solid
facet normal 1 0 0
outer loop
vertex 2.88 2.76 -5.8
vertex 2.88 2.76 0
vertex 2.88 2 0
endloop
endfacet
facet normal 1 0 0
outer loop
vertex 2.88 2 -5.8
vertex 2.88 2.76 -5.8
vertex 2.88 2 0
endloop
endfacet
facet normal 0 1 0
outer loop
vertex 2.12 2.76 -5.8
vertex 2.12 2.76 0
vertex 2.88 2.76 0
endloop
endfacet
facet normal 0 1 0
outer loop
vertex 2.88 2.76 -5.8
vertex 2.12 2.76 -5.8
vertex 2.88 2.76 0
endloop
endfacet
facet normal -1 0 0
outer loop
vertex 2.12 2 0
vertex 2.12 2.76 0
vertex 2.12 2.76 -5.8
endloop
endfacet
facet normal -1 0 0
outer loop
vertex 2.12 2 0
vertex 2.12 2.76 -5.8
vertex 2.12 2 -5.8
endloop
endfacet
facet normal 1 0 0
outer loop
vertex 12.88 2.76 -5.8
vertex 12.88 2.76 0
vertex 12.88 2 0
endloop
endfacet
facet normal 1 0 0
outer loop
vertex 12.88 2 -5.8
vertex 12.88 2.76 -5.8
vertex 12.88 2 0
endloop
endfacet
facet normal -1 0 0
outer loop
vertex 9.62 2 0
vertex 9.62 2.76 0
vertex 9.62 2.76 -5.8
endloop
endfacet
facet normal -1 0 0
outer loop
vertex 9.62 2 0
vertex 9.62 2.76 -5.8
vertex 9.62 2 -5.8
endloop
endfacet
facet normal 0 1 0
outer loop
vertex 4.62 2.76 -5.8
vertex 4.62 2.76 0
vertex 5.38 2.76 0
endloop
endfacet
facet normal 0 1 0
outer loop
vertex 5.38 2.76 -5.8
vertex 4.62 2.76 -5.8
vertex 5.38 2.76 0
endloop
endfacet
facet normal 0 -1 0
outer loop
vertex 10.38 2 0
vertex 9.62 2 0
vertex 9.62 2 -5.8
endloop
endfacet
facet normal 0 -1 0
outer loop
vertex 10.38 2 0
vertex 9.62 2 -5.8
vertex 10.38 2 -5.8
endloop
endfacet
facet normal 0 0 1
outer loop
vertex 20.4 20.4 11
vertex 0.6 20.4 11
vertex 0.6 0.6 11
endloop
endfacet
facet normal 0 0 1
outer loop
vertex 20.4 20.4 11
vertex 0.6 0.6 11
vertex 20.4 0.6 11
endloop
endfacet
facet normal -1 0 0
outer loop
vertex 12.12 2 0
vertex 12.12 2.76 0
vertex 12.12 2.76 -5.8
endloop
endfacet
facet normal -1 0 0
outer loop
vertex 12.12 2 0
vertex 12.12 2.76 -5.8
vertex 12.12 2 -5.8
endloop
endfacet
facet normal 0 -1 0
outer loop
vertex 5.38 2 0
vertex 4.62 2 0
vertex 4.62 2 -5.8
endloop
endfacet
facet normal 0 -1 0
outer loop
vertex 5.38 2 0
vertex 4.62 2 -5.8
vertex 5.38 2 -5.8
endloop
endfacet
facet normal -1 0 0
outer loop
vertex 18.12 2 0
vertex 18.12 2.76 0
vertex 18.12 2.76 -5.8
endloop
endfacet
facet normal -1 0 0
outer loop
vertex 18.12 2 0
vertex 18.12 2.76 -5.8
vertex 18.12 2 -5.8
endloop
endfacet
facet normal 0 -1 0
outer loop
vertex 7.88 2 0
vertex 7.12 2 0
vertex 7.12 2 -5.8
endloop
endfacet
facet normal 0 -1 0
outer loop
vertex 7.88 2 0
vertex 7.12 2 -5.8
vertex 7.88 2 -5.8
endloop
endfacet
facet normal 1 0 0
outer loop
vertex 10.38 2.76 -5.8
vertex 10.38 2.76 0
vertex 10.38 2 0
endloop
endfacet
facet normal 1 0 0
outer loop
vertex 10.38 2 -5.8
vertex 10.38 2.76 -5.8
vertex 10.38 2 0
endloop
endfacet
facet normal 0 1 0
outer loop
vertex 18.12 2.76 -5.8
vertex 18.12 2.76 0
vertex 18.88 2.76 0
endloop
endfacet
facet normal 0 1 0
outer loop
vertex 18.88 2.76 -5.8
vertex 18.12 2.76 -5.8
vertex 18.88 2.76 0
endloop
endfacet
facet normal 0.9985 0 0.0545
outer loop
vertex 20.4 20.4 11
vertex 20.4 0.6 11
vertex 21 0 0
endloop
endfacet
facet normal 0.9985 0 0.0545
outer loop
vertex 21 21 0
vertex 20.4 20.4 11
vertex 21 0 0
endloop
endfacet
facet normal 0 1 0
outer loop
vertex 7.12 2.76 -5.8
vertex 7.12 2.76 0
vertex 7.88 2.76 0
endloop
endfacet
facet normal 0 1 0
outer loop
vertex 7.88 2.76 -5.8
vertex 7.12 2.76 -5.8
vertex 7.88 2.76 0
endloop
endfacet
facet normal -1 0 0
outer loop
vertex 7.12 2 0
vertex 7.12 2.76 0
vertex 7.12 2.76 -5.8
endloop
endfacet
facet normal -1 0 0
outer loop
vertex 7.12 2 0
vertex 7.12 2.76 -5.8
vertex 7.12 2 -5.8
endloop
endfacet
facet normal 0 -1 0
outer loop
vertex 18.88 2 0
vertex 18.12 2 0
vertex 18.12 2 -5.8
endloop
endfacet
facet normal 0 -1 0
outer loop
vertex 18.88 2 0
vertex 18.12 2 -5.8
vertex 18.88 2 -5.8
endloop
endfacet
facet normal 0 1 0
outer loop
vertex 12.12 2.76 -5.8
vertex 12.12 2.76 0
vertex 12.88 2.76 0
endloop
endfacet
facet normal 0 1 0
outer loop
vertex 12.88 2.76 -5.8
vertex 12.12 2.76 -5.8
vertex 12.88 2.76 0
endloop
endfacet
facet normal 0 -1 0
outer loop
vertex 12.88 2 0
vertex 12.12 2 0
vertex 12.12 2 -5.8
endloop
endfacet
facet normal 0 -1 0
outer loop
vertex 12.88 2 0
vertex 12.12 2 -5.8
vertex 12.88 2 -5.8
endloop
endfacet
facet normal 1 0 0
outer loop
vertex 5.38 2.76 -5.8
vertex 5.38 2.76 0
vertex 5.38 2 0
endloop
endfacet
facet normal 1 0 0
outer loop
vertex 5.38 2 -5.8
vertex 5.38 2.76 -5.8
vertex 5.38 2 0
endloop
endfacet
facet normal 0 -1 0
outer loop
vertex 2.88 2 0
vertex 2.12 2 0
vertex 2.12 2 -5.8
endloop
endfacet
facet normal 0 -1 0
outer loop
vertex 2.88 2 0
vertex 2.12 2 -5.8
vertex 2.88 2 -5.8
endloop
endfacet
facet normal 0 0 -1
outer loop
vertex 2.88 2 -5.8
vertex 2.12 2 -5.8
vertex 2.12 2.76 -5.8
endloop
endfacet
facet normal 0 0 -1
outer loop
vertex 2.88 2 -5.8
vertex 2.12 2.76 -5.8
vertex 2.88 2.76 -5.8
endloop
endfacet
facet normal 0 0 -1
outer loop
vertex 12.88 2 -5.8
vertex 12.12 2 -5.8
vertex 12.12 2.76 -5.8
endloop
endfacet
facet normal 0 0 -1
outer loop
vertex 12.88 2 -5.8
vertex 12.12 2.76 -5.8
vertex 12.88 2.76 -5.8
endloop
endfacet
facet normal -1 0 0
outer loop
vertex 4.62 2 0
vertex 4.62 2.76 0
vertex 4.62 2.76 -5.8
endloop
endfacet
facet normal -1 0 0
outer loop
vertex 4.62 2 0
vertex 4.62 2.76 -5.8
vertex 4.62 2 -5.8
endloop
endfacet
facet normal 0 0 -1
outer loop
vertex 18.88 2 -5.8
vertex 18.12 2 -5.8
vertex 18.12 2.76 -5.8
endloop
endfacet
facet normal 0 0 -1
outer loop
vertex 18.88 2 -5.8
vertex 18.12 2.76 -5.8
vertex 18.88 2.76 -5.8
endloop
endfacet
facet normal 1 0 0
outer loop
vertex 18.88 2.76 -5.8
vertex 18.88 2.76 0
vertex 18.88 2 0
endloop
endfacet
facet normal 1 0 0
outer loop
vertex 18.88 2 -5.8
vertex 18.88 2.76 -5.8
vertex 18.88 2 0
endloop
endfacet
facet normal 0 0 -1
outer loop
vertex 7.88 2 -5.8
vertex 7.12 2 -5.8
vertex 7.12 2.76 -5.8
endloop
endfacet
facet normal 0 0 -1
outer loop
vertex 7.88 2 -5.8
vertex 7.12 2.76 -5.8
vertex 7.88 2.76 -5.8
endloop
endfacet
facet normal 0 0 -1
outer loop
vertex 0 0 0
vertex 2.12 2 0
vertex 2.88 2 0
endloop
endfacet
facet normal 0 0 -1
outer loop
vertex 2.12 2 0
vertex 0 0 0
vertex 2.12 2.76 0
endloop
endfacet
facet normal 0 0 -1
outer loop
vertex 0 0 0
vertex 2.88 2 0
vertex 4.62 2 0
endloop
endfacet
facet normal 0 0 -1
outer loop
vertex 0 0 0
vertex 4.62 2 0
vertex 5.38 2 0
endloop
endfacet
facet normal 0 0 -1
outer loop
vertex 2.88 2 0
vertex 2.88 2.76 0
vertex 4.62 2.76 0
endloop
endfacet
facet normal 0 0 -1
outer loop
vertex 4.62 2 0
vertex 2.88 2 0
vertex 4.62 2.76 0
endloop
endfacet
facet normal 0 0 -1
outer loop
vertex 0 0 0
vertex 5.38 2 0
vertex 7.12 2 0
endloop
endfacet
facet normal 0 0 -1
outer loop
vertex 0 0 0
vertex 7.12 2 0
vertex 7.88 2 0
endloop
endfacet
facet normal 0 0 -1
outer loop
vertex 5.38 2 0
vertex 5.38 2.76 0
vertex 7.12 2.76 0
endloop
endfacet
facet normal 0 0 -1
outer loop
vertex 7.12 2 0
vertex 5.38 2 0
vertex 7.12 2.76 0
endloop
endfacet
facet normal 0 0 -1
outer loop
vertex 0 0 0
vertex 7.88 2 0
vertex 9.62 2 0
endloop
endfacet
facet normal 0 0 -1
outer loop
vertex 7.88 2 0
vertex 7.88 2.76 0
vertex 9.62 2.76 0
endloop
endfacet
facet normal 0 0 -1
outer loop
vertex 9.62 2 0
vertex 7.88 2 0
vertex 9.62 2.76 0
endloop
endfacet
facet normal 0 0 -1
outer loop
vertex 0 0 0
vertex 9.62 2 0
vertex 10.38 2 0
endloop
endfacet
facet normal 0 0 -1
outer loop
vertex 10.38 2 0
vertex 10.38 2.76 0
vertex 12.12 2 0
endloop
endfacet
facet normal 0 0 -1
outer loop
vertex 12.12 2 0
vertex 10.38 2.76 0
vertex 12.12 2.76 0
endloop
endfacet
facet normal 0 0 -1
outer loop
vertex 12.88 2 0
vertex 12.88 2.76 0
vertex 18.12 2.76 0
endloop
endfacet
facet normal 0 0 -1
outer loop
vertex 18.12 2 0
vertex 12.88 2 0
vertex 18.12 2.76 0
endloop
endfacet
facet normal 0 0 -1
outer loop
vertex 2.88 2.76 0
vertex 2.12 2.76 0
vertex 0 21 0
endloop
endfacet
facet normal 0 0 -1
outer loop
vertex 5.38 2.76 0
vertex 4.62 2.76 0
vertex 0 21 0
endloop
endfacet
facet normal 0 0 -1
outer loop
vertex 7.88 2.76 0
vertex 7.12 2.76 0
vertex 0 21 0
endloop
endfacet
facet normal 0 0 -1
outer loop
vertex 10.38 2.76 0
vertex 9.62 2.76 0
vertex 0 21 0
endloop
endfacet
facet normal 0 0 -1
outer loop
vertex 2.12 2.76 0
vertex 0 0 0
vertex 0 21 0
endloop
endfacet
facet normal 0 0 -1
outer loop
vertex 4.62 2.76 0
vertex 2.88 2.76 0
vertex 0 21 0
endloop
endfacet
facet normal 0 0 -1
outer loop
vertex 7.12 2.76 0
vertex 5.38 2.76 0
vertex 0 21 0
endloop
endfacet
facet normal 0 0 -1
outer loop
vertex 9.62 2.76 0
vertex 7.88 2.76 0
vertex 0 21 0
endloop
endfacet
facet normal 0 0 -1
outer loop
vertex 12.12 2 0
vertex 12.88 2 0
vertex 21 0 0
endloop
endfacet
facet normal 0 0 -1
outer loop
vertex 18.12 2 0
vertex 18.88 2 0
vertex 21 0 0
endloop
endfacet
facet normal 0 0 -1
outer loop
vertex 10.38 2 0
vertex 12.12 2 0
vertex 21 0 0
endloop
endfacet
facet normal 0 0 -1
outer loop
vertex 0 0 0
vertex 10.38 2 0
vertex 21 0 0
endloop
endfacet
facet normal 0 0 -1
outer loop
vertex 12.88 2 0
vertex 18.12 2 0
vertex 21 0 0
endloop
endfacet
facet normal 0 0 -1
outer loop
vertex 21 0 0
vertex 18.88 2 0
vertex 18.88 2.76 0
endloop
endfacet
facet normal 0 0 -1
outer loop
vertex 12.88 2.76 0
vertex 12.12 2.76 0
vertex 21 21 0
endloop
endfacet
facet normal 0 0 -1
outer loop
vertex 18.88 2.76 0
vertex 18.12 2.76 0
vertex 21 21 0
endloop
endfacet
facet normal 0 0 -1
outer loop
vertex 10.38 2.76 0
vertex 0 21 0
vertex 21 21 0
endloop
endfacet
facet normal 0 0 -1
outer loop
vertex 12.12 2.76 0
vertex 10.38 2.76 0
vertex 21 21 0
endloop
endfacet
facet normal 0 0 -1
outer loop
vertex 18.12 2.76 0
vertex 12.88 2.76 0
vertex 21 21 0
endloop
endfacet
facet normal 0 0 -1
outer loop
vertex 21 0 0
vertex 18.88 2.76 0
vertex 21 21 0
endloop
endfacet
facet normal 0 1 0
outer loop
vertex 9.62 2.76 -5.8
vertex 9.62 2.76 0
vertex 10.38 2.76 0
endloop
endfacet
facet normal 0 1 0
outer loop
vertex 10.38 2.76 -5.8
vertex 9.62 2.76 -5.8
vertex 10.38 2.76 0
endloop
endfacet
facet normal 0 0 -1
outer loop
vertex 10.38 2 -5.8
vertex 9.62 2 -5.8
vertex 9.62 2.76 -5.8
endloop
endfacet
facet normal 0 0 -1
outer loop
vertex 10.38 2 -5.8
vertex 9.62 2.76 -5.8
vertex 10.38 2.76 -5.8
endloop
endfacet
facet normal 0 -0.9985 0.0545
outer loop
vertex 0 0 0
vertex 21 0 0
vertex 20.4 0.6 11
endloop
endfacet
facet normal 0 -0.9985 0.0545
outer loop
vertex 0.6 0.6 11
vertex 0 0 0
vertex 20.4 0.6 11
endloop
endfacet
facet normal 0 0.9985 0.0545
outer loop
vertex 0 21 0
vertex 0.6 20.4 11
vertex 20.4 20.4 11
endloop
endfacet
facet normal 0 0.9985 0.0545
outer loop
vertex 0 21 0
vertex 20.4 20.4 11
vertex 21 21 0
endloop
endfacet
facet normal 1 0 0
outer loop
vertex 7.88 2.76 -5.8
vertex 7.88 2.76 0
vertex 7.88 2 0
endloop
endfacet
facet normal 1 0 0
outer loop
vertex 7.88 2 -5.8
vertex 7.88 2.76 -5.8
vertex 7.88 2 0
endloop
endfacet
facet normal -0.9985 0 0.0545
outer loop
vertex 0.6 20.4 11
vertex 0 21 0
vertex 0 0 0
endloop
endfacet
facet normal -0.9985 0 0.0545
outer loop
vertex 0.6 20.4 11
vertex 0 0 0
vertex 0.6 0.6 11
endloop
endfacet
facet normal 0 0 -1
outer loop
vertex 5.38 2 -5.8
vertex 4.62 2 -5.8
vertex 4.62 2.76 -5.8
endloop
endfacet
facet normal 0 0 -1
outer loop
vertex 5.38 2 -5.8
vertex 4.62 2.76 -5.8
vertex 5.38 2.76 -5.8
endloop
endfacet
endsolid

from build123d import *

# Parameters (mm, degrees)
F0_W     = 21
F0_H     = 21
F1_DEPTH = 11
F3_DEPTH = 21.001
F5_DEPTH = 25
F6_W     = 0.76
F6_H     = 0.76
F7_DEPTH = 5.8


with BuildPart() as f1:
    # F0 (on Top) → F1 (new body)
    with BuildSketch(Plane.XY):
        with Locations((10.5, 10.5)):
            Rectangle(F0_W, F0_H)
    extrude(amount=F1_DEPTH)

    # F2 (on face) → F3 (cut, through all)
    with BuildSketch(Plane.XZ):
        Polygon((0, 11), (0, 0), (0.6, 11), align=None)
        Polygon((20.4, 11), (21, 0), (21, 11), align=None)
    extrude(amount=-F3_DEPTH, mode=Mode.SUBTRACT)

    # F4 (on Right) → F5 (cut)
    with BuildSketch(Plane.YZ):
        Polygon((20.4, 11), (21, 0), (21, 11), align=None)
        Polygon((0, 11), (0, 0), (0.6, 11), align=None)
    extrude(amount=F5_DEPTH, mode=Mode.SUBTRACT)

    # F6 (on face) → F7 (join)
    with BuildSketch(Plane(origin=(0, 0, 0), x_dir=(1, 0, 0), z_dir=(0, 0, -1))):
        with Locations((2.5, -2.38)):
            Rectangle(F6_W, F6_H)
        with Locations((5, -2.38)):
            Rectangle(F6_W, F6_H)
        with Locations((7.5, -2.38)):
            Rectangle(F6_W, F6_H)
        with Locations((10, -2.38)):
            Rectangle(F6_W, F6_H)
        with Locations((12.5, -2.38)):
            Rectangle(F6_W, F6_H)
        with Locations((18.5, -2.38)):
            Rectangle(F6_W, F6_H)
    extrude(amount=F7_DEPTH)


solid = f1.part
